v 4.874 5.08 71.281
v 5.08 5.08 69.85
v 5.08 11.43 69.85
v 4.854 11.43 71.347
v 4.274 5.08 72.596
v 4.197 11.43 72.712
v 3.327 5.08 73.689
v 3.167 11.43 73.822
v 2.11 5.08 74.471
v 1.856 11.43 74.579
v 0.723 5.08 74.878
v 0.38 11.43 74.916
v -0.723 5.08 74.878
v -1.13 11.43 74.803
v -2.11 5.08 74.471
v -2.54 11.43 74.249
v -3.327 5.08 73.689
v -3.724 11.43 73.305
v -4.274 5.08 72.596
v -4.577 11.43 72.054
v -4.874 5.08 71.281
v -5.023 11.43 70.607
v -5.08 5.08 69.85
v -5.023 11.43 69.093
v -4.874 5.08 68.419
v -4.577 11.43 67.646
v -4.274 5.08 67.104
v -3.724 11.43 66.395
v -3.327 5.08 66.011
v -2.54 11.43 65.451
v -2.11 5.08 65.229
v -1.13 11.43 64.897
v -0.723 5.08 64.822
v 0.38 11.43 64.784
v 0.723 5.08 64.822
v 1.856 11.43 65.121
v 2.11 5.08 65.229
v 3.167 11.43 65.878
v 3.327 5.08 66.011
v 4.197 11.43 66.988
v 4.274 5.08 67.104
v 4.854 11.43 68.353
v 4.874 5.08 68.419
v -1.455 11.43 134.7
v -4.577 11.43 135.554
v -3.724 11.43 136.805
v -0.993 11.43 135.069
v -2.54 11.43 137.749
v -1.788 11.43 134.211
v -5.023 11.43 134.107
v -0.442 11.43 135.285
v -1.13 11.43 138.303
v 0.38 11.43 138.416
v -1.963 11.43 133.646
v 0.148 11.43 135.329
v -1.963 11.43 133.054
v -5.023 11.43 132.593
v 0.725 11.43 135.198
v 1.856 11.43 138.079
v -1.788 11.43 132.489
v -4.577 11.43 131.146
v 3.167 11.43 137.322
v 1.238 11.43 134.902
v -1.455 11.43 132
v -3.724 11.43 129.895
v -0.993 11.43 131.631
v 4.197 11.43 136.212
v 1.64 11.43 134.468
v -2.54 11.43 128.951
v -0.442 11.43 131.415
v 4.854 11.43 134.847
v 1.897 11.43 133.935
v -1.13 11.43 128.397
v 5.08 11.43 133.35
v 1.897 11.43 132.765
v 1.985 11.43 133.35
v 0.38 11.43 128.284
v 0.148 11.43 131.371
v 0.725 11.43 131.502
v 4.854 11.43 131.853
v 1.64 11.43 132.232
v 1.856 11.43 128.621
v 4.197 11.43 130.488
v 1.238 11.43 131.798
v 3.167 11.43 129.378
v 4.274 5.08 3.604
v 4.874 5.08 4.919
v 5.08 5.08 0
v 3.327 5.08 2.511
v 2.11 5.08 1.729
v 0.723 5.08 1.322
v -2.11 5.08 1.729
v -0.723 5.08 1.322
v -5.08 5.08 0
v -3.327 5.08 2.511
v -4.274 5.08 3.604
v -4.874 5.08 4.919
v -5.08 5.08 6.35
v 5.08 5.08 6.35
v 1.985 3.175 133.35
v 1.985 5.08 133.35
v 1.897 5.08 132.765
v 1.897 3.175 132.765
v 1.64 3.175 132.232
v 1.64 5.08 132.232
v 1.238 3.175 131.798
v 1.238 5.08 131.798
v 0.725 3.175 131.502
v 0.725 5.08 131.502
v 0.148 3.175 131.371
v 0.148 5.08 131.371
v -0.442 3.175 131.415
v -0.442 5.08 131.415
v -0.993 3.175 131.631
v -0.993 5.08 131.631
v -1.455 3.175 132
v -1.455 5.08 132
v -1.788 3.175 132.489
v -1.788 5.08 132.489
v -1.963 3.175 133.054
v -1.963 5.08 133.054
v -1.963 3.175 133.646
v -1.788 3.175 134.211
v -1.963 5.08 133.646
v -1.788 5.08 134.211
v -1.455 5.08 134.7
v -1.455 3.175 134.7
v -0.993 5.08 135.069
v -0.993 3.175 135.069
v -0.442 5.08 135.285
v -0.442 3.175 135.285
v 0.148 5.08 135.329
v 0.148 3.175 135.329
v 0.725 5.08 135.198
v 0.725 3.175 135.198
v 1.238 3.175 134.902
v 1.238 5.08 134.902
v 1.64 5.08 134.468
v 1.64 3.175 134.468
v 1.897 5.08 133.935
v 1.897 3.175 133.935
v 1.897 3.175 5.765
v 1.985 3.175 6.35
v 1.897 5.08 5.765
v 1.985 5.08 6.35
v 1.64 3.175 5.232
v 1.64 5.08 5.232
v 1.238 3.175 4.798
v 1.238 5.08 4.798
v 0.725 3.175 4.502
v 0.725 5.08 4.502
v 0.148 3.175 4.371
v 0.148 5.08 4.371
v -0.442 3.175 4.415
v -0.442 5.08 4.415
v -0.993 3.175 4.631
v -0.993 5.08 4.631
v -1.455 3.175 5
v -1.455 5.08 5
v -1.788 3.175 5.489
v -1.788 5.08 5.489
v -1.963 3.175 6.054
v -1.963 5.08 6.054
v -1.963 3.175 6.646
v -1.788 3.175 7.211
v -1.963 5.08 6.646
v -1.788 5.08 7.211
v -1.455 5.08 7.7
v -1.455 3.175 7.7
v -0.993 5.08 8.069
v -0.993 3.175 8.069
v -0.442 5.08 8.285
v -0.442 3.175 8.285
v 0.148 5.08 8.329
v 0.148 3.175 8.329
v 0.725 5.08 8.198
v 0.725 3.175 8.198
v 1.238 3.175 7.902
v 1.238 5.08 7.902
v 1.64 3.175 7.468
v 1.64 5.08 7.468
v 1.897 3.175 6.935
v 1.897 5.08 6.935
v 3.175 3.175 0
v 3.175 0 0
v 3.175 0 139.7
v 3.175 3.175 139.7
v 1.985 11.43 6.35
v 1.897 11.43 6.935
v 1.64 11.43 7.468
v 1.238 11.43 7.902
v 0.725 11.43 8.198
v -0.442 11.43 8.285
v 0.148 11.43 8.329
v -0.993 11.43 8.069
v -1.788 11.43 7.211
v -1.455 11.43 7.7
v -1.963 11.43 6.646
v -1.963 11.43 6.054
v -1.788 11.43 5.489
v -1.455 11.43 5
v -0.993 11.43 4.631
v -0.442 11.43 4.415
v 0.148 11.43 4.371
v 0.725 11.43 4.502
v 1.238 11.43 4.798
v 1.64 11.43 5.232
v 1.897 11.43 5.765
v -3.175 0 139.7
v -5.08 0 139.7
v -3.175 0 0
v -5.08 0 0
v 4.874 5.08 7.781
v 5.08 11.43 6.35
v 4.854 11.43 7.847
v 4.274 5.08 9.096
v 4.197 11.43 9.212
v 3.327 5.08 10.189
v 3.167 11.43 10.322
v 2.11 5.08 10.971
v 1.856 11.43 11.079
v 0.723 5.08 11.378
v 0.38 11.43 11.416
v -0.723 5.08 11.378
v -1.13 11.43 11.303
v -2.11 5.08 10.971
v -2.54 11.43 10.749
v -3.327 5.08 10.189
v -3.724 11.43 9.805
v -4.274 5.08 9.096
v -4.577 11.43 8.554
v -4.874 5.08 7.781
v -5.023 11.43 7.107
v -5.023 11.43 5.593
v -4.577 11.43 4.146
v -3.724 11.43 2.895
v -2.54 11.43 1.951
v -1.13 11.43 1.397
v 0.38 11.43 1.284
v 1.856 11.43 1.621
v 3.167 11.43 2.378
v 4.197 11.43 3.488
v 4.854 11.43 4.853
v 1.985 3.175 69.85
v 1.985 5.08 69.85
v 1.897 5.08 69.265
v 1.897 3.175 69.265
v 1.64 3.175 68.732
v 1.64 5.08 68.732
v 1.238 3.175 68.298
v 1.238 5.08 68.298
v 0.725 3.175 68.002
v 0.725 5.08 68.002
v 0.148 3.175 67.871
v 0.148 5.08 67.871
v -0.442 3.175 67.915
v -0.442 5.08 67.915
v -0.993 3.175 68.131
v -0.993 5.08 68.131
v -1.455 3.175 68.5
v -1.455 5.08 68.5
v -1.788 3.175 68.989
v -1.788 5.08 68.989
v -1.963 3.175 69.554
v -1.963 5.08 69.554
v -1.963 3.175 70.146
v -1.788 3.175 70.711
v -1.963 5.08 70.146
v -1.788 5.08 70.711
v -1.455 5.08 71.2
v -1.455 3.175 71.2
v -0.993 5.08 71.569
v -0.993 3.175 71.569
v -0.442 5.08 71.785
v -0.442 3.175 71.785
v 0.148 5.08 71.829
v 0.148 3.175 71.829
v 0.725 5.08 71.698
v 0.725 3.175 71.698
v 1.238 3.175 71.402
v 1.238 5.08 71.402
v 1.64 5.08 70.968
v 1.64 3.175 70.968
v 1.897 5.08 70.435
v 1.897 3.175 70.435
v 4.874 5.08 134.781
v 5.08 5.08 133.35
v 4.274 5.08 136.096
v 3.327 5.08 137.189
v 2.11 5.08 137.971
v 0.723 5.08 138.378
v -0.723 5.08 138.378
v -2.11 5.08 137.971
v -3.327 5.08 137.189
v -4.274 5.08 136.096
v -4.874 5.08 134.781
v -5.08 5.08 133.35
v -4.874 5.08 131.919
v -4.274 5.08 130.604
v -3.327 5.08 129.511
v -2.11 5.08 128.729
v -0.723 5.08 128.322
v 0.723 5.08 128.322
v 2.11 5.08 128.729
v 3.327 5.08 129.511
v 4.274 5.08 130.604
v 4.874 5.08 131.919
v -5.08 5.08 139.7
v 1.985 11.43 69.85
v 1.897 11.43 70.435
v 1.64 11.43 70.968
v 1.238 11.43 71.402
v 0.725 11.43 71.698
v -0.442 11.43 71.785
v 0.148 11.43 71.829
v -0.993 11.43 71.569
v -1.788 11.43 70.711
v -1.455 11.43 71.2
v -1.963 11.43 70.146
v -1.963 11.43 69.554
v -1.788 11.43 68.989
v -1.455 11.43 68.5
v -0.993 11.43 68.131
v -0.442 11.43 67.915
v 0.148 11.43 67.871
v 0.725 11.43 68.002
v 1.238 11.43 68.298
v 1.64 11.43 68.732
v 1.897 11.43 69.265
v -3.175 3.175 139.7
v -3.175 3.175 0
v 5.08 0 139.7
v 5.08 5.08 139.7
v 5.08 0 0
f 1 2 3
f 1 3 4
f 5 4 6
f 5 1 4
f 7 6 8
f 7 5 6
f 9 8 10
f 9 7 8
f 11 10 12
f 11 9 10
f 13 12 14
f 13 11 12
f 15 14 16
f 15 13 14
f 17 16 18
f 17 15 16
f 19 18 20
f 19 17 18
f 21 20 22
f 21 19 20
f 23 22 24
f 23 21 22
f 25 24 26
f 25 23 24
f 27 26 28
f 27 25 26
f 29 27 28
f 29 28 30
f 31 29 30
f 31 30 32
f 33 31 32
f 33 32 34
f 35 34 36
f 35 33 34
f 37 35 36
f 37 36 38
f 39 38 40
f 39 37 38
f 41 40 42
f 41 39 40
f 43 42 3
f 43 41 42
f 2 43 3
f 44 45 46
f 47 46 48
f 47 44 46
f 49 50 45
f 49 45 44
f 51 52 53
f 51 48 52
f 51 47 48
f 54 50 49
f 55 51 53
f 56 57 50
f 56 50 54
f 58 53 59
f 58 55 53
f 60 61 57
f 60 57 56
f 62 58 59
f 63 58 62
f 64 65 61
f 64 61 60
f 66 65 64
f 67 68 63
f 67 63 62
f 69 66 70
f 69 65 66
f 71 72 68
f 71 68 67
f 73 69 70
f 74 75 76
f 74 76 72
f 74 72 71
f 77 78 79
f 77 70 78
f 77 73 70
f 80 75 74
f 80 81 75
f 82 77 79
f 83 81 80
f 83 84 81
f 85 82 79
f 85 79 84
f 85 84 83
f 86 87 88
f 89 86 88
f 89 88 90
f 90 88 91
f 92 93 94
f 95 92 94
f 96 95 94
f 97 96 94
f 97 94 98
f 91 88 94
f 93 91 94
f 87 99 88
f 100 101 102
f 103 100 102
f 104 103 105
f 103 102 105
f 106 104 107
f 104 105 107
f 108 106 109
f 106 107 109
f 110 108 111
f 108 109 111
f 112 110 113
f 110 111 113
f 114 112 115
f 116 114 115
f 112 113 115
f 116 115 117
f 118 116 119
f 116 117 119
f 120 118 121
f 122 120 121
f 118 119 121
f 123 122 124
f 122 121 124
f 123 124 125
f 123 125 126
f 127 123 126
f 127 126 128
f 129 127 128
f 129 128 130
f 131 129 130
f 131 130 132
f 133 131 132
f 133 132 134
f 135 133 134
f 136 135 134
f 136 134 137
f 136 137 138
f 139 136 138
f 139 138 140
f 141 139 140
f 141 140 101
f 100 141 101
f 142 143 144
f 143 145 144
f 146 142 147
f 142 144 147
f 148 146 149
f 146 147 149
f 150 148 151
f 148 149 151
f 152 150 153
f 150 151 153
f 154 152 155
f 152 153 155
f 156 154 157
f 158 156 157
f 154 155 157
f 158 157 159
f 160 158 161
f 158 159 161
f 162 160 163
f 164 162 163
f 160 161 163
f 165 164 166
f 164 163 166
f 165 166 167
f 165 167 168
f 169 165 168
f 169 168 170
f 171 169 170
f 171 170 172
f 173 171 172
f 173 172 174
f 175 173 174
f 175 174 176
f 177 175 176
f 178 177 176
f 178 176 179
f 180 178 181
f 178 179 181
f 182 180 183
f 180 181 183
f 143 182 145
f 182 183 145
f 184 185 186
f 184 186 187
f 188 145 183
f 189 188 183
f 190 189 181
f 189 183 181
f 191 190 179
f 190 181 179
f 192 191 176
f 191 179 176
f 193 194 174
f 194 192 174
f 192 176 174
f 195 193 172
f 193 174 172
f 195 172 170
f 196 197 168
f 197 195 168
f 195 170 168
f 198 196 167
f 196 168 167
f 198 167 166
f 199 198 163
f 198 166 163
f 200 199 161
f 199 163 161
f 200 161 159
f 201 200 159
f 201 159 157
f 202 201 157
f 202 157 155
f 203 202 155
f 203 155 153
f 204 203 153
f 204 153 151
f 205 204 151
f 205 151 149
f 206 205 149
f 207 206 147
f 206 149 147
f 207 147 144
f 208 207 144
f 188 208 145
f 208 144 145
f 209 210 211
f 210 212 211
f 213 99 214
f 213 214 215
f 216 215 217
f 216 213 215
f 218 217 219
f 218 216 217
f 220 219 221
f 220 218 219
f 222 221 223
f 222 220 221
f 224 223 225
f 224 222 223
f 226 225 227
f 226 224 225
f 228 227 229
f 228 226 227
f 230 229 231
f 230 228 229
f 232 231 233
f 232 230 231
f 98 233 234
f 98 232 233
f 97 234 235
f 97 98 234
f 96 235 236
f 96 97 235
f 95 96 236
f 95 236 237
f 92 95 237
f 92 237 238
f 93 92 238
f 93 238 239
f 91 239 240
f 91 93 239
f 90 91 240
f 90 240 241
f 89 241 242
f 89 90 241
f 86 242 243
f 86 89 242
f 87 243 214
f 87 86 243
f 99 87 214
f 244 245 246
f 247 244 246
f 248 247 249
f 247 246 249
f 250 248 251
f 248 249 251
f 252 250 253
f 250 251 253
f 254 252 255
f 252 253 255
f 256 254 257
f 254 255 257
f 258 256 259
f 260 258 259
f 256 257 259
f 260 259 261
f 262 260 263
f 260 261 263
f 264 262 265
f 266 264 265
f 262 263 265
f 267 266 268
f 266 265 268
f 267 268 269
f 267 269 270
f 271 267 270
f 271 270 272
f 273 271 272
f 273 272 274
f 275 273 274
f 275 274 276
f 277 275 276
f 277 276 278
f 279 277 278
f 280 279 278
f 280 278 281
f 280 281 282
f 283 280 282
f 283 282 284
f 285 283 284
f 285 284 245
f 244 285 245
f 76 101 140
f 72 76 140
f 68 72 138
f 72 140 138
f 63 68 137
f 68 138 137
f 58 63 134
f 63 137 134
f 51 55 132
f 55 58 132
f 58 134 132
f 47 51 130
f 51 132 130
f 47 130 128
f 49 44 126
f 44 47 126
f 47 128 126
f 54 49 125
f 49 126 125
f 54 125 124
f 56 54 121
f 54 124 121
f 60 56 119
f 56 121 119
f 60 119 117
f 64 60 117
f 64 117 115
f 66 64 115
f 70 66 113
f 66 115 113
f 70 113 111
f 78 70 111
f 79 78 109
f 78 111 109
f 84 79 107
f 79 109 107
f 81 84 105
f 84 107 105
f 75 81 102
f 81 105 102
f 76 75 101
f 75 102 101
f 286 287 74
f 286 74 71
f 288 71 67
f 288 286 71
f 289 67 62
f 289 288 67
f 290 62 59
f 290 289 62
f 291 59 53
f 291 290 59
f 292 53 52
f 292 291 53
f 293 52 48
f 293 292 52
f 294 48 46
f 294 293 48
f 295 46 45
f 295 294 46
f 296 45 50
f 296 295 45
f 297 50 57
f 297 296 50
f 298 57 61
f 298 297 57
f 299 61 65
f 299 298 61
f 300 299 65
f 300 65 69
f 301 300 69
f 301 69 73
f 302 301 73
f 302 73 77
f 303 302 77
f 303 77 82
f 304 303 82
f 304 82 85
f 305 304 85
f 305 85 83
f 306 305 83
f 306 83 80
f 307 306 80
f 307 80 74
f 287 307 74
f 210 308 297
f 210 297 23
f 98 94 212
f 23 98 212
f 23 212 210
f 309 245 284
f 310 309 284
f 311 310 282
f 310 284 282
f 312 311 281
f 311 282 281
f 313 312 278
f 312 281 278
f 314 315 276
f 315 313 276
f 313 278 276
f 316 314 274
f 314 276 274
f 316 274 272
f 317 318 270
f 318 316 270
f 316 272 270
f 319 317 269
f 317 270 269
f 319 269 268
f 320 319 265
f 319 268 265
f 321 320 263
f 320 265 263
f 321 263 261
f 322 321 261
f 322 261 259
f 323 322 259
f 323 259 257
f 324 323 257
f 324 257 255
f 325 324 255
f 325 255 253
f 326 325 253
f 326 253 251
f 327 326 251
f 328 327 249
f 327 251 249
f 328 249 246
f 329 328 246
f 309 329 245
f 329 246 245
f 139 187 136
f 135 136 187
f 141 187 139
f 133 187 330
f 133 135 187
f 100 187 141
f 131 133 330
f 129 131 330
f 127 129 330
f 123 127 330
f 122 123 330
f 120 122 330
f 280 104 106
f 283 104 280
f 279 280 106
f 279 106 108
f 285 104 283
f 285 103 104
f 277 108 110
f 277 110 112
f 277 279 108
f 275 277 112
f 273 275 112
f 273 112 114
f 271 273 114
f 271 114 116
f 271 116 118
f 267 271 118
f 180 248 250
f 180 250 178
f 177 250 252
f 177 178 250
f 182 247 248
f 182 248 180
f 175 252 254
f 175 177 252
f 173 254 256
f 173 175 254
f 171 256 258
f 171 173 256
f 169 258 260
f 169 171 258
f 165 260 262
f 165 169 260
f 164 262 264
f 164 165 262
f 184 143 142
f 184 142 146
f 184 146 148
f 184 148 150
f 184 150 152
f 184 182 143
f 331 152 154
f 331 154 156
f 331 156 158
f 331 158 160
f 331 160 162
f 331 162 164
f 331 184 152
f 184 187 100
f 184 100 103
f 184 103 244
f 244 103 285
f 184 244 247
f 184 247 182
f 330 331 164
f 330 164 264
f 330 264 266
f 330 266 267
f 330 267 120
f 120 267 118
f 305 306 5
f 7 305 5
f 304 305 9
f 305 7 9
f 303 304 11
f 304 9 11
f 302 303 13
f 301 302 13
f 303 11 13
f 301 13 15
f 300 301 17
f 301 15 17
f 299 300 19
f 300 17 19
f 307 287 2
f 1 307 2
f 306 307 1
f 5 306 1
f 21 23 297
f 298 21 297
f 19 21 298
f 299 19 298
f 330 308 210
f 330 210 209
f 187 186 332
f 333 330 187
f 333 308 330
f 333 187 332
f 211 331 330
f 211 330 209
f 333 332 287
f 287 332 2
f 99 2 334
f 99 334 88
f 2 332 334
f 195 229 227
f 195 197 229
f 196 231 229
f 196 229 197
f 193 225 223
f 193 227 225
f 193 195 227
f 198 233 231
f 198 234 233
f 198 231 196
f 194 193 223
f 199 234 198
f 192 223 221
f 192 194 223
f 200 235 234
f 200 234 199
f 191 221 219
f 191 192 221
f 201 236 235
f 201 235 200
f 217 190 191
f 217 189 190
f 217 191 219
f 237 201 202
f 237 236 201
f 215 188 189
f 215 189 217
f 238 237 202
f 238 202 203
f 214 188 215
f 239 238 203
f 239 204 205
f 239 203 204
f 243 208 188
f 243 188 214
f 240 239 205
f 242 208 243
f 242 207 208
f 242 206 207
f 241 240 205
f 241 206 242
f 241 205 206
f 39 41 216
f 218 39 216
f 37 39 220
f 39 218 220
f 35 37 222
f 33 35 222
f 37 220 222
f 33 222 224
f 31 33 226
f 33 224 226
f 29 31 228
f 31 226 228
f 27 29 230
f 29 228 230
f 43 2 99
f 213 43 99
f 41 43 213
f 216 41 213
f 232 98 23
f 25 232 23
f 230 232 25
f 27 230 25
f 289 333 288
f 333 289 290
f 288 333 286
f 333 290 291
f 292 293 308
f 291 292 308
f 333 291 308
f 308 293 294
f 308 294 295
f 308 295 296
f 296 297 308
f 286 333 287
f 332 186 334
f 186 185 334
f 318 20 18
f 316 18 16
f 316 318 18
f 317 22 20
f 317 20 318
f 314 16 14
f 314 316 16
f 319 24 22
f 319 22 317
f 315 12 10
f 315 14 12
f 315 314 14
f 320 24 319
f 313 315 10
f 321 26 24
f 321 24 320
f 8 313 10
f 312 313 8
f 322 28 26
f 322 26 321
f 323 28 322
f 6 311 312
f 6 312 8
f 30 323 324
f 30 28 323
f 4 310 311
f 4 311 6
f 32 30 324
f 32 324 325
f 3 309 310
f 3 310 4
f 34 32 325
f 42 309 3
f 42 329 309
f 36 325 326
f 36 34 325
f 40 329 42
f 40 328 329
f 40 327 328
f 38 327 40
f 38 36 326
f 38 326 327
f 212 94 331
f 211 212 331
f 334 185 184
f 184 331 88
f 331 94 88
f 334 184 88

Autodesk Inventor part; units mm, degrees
ref_plane "YZ Plane" through (0, 0, 0) normal (1, 0, 0) x (0, 1, 0)
ref_plane "XZ Plane" through (0, 0, 0) normal (0, 1, 0) x (-1, 0, 0)
ref_plane "XY Plane" through (0, 0, 0) normal (0, 0, 1) x (1, 0, 0)
sketch "Sketch1" plane through (0, 0, 0) normal (0, 0, 1) x (1, 0, 0)
  line L0 (3.175, 0) -> (3.175, 3.175)
  line L1 (3.175, 3.175) -> (-3.175, 3.175)
  line L2 (-3.175, 3.175) -> (-3.175, 0)
  line L3 (5.08, 0) -> (5.08, 5.08)
  line L4 (5.08, 5.08) -> (-5.08, 5.08)
  line L5 (-5.08, 5.08) -> (-5.08, 0)
  line L6 (-5.08, 0) -> (-3.175, 0)
  line L7 (3.175, 0) -> (5.08, 0)
  point P0 (0, 0)
  dimension "d0" = 10.16
  dimension "d1" = 5.08
extrude "Extrusion1" add sketch "Sketch1" along normal blind 139.7
sketch "Sketch2" plane through (-5.08, 5.08, 0) normal (0, 1, 0) x (1, 0, 0)
  circle A0 centre (5.08, -6.35) radius 1.985
  circle A1 centre (5.08, -133.35) radius 1.985
  circle A2 centre (5.08, -69.85) radius 1.985
  point P0 (5.08, 0)
  dimension "d4" = 3.97
  dimension "d5" = 3.97
  dimension "d10" = 3.97
extrude "Extrusion2" cut sketch "Sketch2" against normal blind 139.7
sketch "Sketch3" plane through (-5.08, 5.08, 0) normal (0, 1, 0) x (1, 0, 0)
  circle A0 centre (5.08, -6.35) radius 1.985 projected
  circle A1 centre (5.08, -133.35) radius 1.985 projected
  circle A2 centre (5.08, -133.35) radius 5.08
  line L0 (0, 0) -> (0, -139.7) projected
  circle A3 centre (5.08, -6.35) radius 5.08
  circle A4 centre (5.08, -69.85) radius 1.985 projected
  circle A5 centre (5.08, -69.85) radius 5.08
  point P0 (5.08, 0)
extrude "Extrusion3" add sketch "Sketch3" along normal blind 6.35
properties part number "arm_xbrace_jig"
